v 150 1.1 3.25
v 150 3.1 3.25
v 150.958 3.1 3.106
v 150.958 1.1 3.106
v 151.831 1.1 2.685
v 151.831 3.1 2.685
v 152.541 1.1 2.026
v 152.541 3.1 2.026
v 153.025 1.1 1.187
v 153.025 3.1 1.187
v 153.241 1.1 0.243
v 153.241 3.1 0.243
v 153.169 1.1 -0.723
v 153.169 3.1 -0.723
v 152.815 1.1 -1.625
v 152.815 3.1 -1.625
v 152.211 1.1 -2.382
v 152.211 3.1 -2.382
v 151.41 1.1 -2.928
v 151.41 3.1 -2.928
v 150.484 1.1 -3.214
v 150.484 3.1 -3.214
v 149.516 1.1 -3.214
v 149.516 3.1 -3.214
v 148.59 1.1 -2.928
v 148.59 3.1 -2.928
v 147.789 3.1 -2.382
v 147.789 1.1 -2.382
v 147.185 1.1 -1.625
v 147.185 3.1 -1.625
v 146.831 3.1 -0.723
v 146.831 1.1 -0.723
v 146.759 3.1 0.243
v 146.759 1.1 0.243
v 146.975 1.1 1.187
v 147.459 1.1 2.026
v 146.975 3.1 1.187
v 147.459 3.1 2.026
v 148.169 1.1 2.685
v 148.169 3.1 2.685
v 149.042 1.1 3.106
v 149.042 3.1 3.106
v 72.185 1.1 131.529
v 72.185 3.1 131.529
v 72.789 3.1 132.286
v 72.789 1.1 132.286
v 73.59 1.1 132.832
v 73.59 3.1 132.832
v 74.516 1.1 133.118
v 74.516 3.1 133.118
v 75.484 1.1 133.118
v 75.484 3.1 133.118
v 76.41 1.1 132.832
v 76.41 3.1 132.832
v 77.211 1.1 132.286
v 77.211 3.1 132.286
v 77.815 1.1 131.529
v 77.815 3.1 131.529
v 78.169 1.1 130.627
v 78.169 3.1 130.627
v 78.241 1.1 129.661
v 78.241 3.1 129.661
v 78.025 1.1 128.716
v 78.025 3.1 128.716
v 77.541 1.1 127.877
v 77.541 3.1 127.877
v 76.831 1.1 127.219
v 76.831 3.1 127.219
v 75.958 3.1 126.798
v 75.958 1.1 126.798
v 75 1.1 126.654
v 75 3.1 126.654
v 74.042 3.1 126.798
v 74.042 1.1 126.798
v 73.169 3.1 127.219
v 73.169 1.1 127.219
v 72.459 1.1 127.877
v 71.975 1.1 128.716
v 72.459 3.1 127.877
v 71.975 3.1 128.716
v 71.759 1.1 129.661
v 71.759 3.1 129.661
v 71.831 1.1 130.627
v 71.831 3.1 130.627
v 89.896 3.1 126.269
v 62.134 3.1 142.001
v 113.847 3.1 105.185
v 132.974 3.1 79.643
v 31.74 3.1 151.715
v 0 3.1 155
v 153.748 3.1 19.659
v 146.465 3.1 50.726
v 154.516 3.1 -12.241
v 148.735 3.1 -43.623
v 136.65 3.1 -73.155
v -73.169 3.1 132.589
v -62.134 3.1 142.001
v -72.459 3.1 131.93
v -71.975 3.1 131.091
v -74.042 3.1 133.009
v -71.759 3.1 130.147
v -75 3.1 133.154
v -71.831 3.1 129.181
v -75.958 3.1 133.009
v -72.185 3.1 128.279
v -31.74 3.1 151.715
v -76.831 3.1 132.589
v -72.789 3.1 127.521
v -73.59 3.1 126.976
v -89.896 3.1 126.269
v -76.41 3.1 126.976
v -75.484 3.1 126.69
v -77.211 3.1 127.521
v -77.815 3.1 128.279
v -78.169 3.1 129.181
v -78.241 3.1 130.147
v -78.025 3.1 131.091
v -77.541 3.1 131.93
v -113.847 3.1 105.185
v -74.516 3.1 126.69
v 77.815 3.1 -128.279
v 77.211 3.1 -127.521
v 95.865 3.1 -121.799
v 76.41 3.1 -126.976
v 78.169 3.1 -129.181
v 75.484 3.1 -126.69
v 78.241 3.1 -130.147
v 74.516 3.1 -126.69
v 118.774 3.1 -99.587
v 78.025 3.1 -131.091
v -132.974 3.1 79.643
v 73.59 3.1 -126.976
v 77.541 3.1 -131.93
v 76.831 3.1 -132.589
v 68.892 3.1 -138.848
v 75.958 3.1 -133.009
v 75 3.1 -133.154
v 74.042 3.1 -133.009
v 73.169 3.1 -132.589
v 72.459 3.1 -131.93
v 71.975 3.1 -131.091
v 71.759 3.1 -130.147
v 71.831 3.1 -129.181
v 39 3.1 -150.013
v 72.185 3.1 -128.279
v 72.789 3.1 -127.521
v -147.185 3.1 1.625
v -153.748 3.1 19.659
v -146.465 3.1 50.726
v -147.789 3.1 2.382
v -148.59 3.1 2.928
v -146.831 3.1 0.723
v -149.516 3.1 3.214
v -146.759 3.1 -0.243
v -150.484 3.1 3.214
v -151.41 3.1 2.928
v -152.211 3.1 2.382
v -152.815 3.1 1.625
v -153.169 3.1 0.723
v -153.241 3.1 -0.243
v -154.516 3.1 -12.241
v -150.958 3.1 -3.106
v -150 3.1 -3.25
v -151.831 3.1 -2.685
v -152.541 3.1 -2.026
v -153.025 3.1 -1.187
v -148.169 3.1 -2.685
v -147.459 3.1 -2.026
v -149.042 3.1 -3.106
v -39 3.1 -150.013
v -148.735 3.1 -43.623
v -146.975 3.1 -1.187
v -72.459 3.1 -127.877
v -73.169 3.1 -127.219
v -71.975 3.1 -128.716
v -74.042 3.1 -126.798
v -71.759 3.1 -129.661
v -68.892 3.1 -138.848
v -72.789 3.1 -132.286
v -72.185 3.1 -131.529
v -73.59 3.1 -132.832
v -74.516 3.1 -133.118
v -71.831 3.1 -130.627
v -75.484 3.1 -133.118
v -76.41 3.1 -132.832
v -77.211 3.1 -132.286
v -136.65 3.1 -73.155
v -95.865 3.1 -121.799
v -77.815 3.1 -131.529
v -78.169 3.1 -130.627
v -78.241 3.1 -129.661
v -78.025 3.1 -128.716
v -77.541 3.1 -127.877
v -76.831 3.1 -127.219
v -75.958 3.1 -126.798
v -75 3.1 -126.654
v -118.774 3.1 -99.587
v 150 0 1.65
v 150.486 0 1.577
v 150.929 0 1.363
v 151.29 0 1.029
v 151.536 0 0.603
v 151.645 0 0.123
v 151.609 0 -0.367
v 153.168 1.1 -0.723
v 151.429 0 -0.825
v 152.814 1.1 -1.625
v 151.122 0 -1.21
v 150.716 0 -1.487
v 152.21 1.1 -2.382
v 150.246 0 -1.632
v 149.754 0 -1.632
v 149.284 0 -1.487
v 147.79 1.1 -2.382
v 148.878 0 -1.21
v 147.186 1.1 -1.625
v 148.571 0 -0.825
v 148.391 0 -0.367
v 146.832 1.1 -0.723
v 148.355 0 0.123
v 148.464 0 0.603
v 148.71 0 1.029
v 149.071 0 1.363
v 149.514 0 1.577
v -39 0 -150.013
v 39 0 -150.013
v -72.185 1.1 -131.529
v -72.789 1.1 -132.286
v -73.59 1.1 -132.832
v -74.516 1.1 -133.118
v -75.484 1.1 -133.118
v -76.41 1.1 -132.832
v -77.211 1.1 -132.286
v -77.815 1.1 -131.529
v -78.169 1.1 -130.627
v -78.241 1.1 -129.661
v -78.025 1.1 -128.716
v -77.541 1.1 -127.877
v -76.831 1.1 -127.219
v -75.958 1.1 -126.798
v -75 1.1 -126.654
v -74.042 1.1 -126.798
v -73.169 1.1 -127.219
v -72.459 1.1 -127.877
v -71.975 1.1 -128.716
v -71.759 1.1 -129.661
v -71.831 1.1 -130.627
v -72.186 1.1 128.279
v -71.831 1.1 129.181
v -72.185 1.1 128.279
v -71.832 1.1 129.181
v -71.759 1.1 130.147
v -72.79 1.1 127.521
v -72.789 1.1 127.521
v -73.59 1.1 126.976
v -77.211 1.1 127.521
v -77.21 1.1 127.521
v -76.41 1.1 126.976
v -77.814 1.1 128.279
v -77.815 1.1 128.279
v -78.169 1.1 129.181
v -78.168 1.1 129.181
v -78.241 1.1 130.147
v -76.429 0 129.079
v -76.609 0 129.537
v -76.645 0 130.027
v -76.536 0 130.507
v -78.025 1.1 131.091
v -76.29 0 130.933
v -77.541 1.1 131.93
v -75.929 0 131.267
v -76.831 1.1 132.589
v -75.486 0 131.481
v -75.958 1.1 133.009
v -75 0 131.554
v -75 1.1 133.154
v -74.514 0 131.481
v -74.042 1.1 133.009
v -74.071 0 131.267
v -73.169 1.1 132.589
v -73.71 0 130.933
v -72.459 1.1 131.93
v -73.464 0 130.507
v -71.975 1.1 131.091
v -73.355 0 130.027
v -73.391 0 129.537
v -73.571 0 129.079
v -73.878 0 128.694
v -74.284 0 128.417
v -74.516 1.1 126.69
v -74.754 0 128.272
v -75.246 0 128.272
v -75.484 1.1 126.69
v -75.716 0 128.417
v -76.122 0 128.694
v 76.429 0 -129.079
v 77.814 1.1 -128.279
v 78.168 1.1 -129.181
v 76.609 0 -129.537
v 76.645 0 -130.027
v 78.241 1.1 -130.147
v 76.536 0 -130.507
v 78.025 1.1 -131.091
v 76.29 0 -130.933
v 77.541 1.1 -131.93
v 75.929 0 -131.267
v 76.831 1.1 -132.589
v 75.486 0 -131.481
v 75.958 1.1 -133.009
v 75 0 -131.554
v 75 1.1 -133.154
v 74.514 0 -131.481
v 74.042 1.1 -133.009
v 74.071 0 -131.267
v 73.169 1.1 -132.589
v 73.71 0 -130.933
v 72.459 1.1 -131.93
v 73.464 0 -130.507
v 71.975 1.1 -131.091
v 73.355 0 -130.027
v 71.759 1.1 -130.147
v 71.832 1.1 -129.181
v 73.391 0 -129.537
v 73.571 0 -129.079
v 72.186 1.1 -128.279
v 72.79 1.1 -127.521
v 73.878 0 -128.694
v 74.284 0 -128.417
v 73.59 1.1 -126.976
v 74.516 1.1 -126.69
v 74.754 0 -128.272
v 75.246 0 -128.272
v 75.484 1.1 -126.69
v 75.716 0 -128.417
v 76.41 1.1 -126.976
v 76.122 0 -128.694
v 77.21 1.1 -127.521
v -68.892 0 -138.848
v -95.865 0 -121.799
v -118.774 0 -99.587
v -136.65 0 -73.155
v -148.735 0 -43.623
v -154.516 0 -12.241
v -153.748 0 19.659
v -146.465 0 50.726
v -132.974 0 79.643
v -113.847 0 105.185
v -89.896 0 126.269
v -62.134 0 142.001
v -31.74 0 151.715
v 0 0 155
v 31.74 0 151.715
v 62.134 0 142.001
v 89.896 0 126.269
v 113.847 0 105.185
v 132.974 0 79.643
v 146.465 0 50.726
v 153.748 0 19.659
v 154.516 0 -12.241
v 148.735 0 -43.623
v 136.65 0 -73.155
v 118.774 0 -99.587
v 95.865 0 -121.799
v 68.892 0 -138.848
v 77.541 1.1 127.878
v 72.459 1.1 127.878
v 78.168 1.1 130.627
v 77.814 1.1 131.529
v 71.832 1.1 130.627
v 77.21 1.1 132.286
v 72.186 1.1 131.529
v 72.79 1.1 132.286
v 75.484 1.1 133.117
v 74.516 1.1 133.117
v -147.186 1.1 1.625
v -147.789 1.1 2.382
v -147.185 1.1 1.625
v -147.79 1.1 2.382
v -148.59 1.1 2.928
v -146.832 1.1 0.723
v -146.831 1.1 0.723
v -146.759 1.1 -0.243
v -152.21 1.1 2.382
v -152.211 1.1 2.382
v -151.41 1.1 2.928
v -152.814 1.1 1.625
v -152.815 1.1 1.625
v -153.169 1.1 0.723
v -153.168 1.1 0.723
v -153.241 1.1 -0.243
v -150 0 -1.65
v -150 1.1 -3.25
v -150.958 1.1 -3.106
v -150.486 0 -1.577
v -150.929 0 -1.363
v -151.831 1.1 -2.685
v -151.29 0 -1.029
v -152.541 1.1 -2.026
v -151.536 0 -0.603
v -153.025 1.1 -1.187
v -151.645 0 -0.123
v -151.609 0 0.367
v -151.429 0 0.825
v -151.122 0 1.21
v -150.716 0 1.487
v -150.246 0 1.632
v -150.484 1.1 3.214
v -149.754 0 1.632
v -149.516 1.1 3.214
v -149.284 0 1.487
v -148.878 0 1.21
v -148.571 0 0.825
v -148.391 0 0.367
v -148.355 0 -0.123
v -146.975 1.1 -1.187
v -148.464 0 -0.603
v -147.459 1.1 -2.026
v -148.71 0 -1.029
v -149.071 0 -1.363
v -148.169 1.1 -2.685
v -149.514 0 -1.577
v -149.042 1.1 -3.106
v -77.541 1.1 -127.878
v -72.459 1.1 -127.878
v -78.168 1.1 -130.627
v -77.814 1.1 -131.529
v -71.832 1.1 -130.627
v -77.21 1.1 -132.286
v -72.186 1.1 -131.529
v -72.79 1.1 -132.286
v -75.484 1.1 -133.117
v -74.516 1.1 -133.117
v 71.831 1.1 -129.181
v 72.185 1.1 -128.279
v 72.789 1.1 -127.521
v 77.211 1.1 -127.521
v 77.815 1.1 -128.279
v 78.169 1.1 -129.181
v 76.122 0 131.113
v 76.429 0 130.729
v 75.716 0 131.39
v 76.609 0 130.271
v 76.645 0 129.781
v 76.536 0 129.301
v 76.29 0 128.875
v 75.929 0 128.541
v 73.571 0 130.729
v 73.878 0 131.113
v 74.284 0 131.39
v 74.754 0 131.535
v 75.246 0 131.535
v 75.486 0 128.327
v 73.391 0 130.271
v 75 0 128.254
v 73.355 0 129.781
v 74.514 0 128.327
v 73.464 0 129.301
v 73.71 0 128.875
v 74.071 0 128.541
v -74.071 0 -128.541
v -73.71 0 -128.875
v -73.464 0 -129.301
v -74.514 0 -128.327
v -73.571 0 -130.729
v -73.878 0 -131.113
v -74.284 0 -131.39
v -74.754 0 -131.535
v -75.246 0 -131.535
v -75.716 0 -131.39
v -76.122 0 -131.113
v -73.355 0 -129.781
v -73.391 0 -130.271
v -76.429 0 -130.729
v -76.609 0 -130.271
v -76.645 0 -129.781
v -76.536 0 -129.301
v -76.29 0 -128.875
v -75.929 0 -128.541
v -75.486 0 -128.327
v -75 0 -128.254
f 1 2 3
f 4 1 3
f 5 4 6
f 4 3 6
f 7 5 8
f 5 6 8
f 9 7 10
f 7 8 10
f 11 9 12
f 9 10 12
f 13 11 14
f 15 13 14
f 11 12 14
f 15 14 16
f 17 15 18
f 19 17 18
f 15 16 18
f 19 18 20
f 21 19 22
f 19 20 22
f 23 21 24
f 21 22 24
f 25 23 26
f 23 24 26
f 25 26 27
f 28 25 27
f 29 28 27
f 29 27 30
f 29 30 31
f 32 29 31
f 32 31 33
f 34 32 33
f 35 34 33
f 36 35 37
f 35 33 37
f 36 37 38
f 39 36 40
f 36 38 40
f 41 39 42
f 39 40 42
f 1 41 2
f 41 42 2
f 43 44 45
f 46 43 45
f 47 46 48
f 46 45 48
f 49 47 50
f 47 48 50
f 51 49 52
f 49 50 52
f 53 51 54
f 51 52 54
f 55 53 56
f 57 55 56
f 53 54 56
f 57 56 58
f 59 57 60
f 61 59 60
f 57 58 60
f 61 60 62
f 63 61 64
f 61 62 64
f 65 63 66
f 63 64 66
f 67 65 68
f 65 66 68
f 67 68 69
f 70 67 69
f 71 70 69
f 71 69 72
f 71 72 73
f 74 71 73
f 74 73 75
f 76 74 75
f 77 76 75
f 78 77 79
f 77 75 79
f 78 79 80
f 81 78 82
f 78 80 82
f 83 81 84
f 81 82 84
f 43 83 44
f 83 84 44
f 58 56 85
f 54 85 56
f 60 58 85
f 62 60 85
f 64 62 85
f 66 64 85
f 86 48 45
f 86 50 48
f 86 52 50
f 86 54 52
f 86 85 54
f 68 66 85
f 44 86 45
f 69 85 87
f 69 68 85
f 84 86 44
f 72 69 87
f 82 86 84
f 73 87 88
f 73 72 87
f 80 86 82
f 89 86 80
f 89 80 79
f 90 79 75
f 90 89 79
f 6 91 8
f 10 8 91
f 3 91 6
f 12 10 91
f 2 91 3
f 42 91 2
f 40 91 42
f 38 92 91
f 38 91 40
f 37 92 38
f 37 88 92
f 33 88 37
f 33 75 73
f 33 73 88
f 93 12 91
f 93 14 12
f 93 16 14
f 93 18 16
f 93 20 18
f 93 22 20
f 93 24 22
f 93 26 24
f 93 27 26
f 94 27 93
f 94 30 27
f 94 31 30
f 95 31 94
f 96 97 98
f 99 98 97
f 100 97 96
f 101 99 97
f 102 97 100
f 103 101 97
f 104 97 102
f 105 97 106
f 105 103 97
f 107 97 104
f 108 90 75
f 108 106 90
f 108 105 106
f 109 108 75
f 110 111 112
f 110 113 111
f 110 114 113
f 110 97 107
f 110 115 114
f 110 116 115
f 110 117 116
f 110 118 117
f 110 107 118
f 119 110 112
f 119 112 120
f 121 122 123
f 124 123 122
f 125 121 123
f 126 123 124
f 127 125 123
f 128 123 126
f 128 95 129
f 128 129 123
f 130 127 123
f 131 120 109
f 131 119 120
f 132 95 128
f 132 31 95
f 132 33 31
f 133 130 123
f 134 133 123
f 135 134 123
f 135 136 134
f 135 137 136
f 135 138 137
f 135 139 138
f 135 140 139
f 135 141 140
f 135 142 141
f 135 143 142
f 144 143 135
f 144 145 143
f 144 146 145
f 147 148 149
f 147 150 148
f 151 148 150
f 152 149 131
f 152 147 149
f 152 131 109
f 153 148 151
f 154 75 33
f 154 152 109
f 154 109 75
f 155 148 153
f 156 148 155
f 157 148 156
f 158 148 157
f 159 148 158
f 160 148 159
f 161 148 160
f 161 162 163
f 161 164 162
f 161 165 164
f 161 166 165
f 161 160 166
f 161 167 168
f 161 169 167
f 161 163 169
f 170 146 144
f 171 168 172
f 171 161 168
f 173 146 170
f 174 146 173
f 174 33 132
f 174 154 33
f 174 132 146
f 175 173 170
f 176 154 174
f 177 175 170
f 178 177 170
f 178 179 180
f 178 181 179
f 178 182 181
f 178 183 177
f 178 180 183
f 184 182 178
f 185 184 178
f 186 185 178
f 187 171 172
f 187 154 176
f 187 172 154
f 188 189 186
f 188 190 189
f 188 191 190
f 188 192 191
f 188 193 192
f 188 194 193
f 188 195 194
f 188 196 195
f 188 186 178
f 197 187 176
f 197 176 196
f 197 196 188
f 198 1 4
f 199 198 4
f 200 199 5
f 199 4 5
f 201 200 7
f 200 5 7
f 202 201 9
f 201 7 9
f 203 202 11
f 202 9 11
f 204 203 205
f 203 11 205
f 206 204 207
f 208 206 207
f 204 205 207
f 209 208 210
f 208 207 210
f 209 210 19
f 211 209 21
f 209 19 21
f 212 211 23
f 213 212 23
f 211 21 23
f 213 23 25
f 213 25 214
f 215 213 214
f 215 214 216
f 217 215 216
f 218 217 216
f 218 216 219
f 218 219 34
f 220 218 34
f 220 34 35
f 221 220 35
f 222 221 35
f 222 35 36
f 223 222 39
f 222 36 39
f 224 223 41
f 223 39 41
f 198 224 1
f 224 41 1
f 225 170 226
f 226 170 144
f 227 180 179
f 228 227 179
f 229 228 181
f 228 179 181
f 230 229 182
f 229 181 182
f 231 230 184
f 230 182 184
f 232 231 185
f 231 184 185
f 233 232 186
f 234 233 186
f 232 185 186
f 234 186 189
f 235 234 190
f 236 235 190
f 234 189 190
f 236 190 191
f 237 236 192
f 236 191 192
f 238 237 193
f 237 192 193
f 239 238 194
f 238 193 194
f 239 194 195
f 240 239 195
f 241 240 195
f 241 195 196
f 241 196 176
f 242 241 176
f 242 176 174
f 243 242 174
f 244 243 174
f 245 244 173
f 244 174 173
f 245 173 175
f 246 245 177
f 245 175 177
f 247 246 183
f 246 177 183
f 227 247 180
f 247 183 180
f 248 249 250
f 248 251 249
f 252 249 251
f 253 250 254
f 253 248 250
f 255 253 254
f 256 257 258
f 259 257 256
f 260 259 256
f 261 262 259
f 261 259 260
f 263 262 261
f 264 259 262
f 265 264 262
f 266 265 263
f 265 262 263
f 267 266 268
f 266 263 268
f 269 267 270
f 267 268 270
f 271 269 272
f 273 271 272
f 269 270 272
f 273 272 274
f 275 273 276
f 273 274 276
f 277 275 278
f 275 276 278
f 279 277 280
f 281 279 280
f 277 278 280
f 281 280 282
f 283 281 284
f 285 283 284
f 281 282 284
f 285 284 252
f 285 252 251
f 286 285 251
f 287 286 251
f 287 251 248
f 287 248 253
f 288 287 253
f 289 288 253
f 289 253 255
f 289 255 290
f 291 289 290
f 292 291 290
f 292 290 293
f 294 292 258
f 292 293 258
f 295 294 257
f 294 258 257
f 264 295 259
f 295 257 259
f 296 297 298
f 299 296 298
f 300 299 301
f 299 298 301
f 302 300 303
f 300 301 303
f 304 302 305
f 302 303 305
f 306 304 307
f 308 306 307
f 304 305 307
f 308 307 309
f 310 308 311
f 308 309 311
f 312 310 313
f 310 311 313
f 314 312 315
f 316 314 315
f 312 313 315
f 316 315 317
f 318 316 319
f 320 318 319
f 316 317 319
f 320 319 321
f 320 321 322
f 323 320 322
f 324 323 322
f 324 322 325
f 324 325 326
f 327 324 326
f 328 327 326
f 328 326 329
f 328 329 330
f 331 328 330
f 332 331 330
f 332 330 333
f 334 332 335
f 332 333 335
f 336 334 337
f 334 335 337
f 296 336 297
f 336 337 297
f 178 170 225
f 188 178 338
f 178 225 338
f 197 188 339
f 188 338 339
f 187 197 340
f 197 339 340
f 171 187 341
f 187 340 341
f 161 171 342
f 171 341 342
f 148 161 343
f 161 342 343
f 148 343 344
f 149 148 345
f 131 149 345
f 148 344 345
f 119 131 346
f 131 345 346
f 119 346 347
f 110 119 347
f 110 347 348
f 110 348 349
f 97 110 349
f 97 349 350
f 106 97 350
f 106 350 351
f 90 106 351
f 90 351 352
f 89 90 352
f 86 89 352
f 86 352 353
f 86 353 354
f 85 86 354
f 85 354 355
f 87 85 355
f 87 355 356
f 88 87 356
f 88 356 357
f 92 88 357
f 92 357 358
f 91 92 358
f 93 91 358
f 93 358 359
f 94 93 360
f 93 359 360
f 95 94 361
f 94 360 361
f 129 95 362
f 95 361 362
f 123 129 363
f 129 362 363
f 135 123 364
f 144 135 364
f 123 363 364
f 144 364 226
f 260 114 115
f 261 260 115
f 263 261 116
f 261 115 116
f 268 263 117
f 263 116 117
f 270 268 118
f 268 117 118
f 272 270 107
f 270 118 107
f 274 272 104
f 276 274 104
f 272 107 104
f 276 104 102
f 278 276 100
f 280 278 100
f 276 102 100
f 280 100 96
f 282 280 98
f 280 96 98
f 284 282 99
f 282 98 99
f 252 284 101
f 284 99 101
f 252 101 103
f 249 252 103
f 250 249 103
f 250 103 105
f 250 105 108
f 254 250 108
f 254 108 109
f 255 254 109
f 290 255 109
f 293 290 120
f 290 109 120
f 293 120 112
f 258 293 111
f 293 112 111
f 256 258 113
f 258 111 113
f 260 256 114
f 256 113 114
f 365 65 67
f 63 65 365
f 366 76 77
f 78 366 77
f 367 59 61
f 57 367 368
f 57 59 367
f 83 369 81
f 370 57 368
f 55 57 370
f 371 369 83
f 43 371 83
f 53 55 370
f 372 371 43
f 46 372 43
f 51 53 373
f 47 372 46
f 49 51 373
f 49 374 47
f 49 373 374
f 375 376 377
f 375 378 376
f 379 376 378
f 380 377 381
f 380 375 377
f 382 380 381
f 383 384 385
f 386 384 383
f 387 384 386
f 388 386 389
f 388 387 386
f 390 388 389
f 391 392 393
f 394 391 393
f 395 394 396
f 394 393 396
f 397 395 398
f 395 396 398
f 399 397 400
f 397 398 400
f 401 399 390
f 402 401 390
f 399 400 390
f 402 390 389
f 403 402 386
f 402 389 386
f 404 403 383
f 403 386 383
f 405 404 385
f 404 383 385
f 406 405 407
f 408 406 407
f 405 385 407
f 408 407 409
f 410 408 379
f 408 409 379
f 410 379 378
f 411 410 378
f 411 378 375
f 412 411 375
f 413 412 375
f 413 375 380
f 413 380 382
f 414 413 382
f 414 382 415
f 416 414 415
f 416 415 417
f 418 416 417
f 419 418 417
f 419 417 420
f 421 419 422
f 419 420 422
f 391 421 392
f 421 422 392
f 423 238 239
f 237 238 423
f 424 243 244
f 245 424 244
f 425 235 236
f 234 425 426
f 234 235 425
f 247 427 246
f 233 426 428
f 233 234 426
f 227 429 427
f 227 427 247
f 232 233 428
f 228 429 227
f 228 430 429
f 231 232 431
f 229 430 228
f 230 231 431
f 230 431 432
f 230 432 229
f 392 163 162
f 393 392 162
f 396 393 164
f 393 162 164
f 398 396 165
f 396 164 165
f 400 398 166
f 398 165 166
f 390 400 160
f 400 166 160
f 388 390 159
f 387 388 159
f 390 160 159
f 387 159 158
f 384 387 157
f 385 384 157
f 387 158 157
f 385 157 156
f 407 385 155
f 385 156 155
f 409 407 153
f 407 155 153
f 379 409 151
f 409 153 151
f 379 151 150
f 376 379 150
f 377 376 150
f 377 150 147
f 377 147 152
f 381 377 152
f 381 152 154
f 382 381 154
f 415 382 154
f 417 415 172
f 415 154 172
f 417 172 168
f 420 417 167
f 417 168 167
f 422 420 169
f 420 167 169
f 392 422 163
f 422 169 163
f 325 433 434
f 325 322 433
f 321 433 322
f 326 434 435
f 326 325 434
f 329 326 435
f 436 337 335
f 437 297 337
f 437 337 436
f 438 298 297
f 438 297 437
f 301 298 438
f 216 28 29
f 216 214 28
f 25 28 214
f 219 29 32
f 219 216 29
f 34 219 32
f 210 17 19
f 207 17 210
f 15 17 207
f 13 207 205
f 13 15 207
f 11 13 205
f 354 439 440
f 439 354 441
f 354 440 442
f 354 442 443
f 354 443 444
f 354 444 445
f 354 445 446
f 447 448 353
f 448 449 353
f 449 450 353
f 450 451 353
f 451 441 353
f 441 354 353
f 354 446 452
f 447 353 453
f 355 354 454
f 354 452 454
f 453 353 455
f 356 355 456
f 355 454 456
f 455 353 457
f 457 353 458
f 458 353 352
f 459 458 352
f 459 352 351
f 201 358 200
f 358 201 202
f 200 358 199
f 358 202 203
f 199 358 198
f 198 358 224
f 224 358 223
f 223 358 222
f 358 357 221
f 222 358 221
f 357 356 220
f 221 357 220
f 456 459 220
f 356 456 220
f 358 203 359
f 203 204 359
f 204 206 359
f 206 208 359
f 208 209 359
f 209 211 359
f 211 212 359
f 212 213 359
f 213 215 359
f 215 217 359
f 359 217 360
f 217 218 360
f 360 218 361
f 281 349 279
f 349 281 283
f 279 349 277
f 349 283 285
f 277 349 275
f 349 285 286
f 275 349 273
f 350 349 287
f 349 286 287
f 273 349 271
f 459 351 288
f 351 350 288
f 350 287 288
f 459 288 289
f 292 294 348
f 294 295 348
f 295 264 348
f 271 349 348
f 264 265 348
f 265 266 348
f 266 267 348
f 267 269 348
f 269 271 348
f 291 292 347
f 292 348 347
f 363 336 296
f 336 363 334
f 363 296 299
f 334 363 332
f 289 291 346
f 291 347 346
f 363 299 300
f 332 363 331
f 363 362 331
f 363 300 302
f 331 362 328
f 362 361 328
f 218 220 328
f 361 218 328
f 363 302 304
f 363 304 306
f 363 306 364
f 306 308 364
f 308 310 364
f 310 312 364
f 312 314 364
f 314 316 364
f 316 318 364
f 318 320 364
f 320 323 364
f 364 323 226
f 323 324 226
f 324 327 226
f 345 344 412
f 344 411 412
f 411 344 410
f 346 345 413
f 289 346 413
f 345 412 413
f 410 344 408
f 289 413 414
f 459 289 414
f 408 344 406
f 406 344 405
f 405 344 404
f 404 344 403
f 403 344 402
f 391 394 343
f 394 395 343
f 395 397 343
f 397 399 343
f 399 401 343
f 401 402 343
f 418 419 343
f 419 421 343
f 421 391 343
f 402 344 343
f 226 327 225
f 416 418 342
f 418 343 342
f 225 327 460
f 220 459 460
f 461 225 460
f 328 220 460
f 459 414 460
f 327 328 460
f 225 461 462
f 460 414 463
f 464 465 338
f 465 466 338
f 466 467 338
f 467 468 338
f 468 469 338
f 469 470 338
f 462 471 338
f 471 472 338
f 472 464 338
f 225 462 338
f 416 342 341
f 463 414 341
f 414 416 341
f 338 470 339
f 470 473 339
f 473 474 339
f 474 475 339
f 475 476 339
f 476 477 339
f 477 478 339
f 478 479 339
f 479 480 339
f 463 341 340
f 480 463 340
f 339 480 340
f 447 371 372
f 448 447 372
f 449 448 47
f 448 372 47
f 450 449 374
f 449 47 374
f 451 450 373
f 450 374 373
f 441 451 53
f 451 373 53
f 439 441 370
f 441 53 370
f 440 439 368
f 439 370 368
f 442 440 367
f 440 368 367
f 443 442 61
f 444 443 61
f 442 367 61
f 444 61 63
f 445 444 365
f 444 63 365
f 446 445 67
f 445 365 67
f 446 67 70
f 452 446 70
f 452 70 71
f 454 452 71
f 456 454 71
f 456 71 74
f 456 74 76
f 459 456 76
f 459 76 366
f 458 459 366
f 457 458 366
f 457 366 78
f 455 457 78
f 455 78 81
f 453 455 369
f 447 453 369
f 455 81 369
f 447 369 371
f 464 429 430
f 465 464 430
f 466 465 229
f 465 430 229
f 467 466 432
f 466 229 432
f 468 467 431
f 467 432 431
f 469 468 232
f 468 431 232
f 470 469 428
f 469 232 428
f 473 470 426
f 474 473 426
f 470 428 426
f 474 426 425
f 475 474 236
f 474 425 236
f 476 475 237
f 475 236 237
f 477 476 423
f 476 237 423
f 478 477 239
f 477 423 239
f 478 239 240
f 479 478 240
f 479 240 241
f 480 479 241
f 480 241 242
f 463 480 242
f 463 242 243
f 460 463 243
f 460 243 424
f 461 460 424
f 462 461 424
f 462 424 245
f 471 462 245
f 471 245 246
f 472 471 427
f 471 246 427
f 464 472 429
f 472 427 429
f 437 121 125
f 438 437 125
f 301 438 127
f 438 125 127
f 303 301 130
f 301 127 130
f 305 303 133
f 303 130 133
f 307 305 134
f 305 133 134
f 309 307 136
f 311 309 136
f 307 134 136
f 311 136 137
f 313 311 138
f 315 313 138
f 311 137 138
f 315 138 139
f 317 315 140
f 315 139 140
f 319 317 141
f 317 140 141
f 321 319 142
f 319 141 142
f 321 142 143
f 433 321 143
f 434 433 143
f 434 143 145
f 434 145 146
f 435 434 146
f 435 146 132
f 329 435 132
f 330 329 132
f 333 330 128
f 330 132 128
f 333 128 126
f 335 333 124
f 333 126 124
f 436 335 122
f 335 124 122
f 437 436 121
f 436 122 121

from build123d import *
from OCP.BRepFilletAPI import BRepFilletAPI_MakeChamfer

# Parameters (mm, degrees)
SKETCH1_R                      = 155
BOSS_EXTRUDE1_DEPTH            = 3.1
SKETCH2_R                      = 1.65
CUT_EXTRUDE1_DEPTH             = 220.225021382
SKETCH3_R                      = 3.25
CUT_EXTRUDE2_DEPTH             = 2
CHAMFER1_SIZE2                 = 1.6
CHAMFER1_SIZE                  = 1.1
CIRPATTERN1_COUNT              = 6
CHAMFER1_OF_CIRPATTERN1_SIZE   = 1.1
CHAMFER1_OF_CIRPATTERN1_SIZE_2 = 1.6
CUT_EXTRUDE3_DEPTH             = 220.225021382


with BuildPart() as part:
    # Sketch1 → Boss-Extrude1 (new body)
    with BuildSketch(Plane(origin=(0, 0, 0), x_dir=(1, 0, 0), z_dir=(0, 1, 0))):
        with Locations(Location((0, 0, 0), (0, 0, 90))):
            Circle(SKETCH1_R)
    extrude(amount=BOSS_EXTRUDE1_DEPTH)

    # Sketch2 → Cut-Extrude1 (cut, through all)
    with BuildSketch(Plane(origin=(0, 3.1, 0), x_dir=(1, 0, 0), z_dir=(0, 1, 0))):
        with Locations(Location((150, 0, 0), (0, 0, 270))):
            Circle(SKETCH2_R)
    cut_extrude1 = extrude(amount=-CUT_EXTRUDE1_DEPTH, mode=Mode.SUBTRACT)

    # Sketch3 → Cut-Extrude2 (cut)
    with BuildSketch(Plane(origin=(0, 3.1, 0), x_dir=(1, 0, 0), z_dir=(0, 1, 0))):
        with Locations(Location((150, 0, 0), (0, 0, 270))):
            Circle(SKETCH3_R)
    cut_extrude2 = extrude(amount=-CUT_EXTRUDE2_DEPTH, mode=Mode.SUBTRACT)

    # Chamfer1
    chamfer1_edges = [part.edges().sort_by_distance(p)[0] for p in [
        (150, 1.1, -1.65),
    ]]
    chamfer1_side = [part.faces().sort_by_distance(p)[0] for p in [
        (150, 1.078, -1.65),
    ]]
    chamfer(chamfer1_edges, length=CHAMFER1_SIZE - 0.0001, length2=CHAMFER1_SIZE2 - 0.0001, reference=chamfer1_side[0])  # a hair under: the kernel refuses the full size

    # CirPattern1: Cut-Extrude1, Cut-Extrude2 ×6 about axis
    cirpattern1_axis = Axis((0, 0, 0), (0, 1, 0))
    add([cut_extrude1.rotate(cirpattern1_axis, i * 360 / CIRPATTERN1_COUNT) for i in range(1, CIRPATTERN1_COUNT)], mode=Mode.SUBTRACT)
    add([cut_extrude2.rotate(cirpattern1_axis, i * 360 / CIRPATTERN1_COUNT) for i in range(1, CIRPATTERN1_COUNT)], mode=Mode.SUBTRACT)

    # Chamfer1 of CirPattern1
    chamfer1_of_cirpattern1_edges_1 = [part.edges().sort_by_distance(p)[0] for p in [
        (73.571058084, 1.1, -130.728810568),
    ]]
    chamfer1_of_cirpattern1_side_1 = [part.faces().sort_by_distance(p)[0] for p in [
        (73.571058084, 1.078, -130.728810568),
    ]]
    chamfer1_of_cirpattern1_edges_2 = [part.edges().sort_by_distance(p)[0] for p in [
        (-76.428941916, 1.1, -129.078810568),
    ]]
    chamfer1_of_cirpattern1_side_2 = [part.faces().sort_by_distance(p)[0] for p in [
        (-76.428941916, 1.078, -129.078810568),
    ]]
    chamfer1_of_cirpattern1_edges_3 = [part.edges().sort_by_distance(p)[0] for p in [
        (-150, 1.1, 1.65),
    ]]
    chamfer1_of_cirpattern1_side_3 = [part.faces().sort_by_distance(p)[0] for p in [
        (-150, 1.078, 1.65),
    ]]
    chamfer1_of_cirpattern1_edges_4 = [part.edges().sort_by_distance(p)[0] for p in [
        (-73.571058084, 1.1, 130.728810568),
    ]]
    chamfer1_of_cirpattern1_side_4 = [part.faces().sort_by_distance(p)[0] for p in [
        (-73.571058084, 1.078, 130.728810568),
    ]]
    chamfer1_of_cirpattern1_edges_5 = [part.edges().sort_by_distance(p)[0] for p in [
        (76.428941916, 1.1, 129.078810568),
    ]]
    chamfer1_of_cirpattern1_side_5 = [part.faces().sort_by_distance(p)[0] for p in [
        (76.428941916, 1.078, 129.078810568),
    ]]
    chamfer1_of_cirpattern1 = BRepFilletAPI_MakeChamfer(part.part.solid().wrapped)
    for e in chamfer1_of_cirpattern1_edges_1:
        chamfer1_of_cirpattern1.Add(CHAMFER1_OF_CIRPATTERN1_SIZE - 0.0001, CHAMFER1_OF_CIRPATTERN1_SIZE_2 - 0.0001, e.wrapped, chamfer1_of_cirpattern1_side_1[0].wrapped)
    for e in chamfer1_of_cirpattern1_edges_2:
        chamfer1_of_cirpattern1.Add(CHAMFER1_OF_CIRPATTERN1_SIZE - 0.0001, CHAMFER1_OF_CIRPATTERN1_SIZE_2 - 0.0001, e.wrapped, chamfer1_of_cirpattern1_side_2[0].wrapped)
    for e in chamfer1_of_cirpattern1_edges_3:
        chamfer1_of_cirpattern1.Add(CHAMFER1_OF_CIRPATTERN1_SIZE - 0.0001, CHAMFER1_OF_CIRPATTERN1_SIZE_2 - 0.0001, e.wrapped, chamfer1_of_cirpattern1_side_3[0].wrapped)
    for e in chamfer1_of_cirpattern1_edges_4:
        chamfer1_of_cirpattern1.Add(CHAMFER1_OF_CIRPATTERN1_SIZE - 0.0001, CHAMFER1_OF_CIRPATTERN1_SIZE_2 - 0.0001, e.wrapped, chamfer1_of_cirpattern1_side_4[0].wrapped)
    for e in chamfer1_of_cirpattern1_edges_5:
        chamfer1_of_cirpattern1.Add(CHAMFER1_OF_CIRPATTERN1_SIZE - 0.0001, CHAMFER1_OF_CIRPATTERN1_SIZE_2 - 0.0001, e.wrapped, chamfer1_of_cirpattern1_side_5[0].wrapped)
    add(Compound.cast(chamfer1_of_cirpattern1.Shape()), mode=Mode.REPLACE)  # a hair under: the kernel refuses the full size

    # Sketch4 → Cut-Extrude3 (cut, through all)
    with BuildSketch(Plane(origin=(0, 3.1, 0), x_dir=(1, 0, 0), z_dir=(0, 1, 0))):
        with BuildLine():
            Line((0, 150.013332741), (39, 150.013332741))
            ThreePointArc((39, 150.013332741), (0, 155), (-39, 150.013332741))
            Line((-39, 150.013332741), (0, 150.013332741))
        make_face()
    extrude(amount=-CUT_EXTRUDE3_DEPTH, mode=Mode.SUBTRACT)


solid = part.part
